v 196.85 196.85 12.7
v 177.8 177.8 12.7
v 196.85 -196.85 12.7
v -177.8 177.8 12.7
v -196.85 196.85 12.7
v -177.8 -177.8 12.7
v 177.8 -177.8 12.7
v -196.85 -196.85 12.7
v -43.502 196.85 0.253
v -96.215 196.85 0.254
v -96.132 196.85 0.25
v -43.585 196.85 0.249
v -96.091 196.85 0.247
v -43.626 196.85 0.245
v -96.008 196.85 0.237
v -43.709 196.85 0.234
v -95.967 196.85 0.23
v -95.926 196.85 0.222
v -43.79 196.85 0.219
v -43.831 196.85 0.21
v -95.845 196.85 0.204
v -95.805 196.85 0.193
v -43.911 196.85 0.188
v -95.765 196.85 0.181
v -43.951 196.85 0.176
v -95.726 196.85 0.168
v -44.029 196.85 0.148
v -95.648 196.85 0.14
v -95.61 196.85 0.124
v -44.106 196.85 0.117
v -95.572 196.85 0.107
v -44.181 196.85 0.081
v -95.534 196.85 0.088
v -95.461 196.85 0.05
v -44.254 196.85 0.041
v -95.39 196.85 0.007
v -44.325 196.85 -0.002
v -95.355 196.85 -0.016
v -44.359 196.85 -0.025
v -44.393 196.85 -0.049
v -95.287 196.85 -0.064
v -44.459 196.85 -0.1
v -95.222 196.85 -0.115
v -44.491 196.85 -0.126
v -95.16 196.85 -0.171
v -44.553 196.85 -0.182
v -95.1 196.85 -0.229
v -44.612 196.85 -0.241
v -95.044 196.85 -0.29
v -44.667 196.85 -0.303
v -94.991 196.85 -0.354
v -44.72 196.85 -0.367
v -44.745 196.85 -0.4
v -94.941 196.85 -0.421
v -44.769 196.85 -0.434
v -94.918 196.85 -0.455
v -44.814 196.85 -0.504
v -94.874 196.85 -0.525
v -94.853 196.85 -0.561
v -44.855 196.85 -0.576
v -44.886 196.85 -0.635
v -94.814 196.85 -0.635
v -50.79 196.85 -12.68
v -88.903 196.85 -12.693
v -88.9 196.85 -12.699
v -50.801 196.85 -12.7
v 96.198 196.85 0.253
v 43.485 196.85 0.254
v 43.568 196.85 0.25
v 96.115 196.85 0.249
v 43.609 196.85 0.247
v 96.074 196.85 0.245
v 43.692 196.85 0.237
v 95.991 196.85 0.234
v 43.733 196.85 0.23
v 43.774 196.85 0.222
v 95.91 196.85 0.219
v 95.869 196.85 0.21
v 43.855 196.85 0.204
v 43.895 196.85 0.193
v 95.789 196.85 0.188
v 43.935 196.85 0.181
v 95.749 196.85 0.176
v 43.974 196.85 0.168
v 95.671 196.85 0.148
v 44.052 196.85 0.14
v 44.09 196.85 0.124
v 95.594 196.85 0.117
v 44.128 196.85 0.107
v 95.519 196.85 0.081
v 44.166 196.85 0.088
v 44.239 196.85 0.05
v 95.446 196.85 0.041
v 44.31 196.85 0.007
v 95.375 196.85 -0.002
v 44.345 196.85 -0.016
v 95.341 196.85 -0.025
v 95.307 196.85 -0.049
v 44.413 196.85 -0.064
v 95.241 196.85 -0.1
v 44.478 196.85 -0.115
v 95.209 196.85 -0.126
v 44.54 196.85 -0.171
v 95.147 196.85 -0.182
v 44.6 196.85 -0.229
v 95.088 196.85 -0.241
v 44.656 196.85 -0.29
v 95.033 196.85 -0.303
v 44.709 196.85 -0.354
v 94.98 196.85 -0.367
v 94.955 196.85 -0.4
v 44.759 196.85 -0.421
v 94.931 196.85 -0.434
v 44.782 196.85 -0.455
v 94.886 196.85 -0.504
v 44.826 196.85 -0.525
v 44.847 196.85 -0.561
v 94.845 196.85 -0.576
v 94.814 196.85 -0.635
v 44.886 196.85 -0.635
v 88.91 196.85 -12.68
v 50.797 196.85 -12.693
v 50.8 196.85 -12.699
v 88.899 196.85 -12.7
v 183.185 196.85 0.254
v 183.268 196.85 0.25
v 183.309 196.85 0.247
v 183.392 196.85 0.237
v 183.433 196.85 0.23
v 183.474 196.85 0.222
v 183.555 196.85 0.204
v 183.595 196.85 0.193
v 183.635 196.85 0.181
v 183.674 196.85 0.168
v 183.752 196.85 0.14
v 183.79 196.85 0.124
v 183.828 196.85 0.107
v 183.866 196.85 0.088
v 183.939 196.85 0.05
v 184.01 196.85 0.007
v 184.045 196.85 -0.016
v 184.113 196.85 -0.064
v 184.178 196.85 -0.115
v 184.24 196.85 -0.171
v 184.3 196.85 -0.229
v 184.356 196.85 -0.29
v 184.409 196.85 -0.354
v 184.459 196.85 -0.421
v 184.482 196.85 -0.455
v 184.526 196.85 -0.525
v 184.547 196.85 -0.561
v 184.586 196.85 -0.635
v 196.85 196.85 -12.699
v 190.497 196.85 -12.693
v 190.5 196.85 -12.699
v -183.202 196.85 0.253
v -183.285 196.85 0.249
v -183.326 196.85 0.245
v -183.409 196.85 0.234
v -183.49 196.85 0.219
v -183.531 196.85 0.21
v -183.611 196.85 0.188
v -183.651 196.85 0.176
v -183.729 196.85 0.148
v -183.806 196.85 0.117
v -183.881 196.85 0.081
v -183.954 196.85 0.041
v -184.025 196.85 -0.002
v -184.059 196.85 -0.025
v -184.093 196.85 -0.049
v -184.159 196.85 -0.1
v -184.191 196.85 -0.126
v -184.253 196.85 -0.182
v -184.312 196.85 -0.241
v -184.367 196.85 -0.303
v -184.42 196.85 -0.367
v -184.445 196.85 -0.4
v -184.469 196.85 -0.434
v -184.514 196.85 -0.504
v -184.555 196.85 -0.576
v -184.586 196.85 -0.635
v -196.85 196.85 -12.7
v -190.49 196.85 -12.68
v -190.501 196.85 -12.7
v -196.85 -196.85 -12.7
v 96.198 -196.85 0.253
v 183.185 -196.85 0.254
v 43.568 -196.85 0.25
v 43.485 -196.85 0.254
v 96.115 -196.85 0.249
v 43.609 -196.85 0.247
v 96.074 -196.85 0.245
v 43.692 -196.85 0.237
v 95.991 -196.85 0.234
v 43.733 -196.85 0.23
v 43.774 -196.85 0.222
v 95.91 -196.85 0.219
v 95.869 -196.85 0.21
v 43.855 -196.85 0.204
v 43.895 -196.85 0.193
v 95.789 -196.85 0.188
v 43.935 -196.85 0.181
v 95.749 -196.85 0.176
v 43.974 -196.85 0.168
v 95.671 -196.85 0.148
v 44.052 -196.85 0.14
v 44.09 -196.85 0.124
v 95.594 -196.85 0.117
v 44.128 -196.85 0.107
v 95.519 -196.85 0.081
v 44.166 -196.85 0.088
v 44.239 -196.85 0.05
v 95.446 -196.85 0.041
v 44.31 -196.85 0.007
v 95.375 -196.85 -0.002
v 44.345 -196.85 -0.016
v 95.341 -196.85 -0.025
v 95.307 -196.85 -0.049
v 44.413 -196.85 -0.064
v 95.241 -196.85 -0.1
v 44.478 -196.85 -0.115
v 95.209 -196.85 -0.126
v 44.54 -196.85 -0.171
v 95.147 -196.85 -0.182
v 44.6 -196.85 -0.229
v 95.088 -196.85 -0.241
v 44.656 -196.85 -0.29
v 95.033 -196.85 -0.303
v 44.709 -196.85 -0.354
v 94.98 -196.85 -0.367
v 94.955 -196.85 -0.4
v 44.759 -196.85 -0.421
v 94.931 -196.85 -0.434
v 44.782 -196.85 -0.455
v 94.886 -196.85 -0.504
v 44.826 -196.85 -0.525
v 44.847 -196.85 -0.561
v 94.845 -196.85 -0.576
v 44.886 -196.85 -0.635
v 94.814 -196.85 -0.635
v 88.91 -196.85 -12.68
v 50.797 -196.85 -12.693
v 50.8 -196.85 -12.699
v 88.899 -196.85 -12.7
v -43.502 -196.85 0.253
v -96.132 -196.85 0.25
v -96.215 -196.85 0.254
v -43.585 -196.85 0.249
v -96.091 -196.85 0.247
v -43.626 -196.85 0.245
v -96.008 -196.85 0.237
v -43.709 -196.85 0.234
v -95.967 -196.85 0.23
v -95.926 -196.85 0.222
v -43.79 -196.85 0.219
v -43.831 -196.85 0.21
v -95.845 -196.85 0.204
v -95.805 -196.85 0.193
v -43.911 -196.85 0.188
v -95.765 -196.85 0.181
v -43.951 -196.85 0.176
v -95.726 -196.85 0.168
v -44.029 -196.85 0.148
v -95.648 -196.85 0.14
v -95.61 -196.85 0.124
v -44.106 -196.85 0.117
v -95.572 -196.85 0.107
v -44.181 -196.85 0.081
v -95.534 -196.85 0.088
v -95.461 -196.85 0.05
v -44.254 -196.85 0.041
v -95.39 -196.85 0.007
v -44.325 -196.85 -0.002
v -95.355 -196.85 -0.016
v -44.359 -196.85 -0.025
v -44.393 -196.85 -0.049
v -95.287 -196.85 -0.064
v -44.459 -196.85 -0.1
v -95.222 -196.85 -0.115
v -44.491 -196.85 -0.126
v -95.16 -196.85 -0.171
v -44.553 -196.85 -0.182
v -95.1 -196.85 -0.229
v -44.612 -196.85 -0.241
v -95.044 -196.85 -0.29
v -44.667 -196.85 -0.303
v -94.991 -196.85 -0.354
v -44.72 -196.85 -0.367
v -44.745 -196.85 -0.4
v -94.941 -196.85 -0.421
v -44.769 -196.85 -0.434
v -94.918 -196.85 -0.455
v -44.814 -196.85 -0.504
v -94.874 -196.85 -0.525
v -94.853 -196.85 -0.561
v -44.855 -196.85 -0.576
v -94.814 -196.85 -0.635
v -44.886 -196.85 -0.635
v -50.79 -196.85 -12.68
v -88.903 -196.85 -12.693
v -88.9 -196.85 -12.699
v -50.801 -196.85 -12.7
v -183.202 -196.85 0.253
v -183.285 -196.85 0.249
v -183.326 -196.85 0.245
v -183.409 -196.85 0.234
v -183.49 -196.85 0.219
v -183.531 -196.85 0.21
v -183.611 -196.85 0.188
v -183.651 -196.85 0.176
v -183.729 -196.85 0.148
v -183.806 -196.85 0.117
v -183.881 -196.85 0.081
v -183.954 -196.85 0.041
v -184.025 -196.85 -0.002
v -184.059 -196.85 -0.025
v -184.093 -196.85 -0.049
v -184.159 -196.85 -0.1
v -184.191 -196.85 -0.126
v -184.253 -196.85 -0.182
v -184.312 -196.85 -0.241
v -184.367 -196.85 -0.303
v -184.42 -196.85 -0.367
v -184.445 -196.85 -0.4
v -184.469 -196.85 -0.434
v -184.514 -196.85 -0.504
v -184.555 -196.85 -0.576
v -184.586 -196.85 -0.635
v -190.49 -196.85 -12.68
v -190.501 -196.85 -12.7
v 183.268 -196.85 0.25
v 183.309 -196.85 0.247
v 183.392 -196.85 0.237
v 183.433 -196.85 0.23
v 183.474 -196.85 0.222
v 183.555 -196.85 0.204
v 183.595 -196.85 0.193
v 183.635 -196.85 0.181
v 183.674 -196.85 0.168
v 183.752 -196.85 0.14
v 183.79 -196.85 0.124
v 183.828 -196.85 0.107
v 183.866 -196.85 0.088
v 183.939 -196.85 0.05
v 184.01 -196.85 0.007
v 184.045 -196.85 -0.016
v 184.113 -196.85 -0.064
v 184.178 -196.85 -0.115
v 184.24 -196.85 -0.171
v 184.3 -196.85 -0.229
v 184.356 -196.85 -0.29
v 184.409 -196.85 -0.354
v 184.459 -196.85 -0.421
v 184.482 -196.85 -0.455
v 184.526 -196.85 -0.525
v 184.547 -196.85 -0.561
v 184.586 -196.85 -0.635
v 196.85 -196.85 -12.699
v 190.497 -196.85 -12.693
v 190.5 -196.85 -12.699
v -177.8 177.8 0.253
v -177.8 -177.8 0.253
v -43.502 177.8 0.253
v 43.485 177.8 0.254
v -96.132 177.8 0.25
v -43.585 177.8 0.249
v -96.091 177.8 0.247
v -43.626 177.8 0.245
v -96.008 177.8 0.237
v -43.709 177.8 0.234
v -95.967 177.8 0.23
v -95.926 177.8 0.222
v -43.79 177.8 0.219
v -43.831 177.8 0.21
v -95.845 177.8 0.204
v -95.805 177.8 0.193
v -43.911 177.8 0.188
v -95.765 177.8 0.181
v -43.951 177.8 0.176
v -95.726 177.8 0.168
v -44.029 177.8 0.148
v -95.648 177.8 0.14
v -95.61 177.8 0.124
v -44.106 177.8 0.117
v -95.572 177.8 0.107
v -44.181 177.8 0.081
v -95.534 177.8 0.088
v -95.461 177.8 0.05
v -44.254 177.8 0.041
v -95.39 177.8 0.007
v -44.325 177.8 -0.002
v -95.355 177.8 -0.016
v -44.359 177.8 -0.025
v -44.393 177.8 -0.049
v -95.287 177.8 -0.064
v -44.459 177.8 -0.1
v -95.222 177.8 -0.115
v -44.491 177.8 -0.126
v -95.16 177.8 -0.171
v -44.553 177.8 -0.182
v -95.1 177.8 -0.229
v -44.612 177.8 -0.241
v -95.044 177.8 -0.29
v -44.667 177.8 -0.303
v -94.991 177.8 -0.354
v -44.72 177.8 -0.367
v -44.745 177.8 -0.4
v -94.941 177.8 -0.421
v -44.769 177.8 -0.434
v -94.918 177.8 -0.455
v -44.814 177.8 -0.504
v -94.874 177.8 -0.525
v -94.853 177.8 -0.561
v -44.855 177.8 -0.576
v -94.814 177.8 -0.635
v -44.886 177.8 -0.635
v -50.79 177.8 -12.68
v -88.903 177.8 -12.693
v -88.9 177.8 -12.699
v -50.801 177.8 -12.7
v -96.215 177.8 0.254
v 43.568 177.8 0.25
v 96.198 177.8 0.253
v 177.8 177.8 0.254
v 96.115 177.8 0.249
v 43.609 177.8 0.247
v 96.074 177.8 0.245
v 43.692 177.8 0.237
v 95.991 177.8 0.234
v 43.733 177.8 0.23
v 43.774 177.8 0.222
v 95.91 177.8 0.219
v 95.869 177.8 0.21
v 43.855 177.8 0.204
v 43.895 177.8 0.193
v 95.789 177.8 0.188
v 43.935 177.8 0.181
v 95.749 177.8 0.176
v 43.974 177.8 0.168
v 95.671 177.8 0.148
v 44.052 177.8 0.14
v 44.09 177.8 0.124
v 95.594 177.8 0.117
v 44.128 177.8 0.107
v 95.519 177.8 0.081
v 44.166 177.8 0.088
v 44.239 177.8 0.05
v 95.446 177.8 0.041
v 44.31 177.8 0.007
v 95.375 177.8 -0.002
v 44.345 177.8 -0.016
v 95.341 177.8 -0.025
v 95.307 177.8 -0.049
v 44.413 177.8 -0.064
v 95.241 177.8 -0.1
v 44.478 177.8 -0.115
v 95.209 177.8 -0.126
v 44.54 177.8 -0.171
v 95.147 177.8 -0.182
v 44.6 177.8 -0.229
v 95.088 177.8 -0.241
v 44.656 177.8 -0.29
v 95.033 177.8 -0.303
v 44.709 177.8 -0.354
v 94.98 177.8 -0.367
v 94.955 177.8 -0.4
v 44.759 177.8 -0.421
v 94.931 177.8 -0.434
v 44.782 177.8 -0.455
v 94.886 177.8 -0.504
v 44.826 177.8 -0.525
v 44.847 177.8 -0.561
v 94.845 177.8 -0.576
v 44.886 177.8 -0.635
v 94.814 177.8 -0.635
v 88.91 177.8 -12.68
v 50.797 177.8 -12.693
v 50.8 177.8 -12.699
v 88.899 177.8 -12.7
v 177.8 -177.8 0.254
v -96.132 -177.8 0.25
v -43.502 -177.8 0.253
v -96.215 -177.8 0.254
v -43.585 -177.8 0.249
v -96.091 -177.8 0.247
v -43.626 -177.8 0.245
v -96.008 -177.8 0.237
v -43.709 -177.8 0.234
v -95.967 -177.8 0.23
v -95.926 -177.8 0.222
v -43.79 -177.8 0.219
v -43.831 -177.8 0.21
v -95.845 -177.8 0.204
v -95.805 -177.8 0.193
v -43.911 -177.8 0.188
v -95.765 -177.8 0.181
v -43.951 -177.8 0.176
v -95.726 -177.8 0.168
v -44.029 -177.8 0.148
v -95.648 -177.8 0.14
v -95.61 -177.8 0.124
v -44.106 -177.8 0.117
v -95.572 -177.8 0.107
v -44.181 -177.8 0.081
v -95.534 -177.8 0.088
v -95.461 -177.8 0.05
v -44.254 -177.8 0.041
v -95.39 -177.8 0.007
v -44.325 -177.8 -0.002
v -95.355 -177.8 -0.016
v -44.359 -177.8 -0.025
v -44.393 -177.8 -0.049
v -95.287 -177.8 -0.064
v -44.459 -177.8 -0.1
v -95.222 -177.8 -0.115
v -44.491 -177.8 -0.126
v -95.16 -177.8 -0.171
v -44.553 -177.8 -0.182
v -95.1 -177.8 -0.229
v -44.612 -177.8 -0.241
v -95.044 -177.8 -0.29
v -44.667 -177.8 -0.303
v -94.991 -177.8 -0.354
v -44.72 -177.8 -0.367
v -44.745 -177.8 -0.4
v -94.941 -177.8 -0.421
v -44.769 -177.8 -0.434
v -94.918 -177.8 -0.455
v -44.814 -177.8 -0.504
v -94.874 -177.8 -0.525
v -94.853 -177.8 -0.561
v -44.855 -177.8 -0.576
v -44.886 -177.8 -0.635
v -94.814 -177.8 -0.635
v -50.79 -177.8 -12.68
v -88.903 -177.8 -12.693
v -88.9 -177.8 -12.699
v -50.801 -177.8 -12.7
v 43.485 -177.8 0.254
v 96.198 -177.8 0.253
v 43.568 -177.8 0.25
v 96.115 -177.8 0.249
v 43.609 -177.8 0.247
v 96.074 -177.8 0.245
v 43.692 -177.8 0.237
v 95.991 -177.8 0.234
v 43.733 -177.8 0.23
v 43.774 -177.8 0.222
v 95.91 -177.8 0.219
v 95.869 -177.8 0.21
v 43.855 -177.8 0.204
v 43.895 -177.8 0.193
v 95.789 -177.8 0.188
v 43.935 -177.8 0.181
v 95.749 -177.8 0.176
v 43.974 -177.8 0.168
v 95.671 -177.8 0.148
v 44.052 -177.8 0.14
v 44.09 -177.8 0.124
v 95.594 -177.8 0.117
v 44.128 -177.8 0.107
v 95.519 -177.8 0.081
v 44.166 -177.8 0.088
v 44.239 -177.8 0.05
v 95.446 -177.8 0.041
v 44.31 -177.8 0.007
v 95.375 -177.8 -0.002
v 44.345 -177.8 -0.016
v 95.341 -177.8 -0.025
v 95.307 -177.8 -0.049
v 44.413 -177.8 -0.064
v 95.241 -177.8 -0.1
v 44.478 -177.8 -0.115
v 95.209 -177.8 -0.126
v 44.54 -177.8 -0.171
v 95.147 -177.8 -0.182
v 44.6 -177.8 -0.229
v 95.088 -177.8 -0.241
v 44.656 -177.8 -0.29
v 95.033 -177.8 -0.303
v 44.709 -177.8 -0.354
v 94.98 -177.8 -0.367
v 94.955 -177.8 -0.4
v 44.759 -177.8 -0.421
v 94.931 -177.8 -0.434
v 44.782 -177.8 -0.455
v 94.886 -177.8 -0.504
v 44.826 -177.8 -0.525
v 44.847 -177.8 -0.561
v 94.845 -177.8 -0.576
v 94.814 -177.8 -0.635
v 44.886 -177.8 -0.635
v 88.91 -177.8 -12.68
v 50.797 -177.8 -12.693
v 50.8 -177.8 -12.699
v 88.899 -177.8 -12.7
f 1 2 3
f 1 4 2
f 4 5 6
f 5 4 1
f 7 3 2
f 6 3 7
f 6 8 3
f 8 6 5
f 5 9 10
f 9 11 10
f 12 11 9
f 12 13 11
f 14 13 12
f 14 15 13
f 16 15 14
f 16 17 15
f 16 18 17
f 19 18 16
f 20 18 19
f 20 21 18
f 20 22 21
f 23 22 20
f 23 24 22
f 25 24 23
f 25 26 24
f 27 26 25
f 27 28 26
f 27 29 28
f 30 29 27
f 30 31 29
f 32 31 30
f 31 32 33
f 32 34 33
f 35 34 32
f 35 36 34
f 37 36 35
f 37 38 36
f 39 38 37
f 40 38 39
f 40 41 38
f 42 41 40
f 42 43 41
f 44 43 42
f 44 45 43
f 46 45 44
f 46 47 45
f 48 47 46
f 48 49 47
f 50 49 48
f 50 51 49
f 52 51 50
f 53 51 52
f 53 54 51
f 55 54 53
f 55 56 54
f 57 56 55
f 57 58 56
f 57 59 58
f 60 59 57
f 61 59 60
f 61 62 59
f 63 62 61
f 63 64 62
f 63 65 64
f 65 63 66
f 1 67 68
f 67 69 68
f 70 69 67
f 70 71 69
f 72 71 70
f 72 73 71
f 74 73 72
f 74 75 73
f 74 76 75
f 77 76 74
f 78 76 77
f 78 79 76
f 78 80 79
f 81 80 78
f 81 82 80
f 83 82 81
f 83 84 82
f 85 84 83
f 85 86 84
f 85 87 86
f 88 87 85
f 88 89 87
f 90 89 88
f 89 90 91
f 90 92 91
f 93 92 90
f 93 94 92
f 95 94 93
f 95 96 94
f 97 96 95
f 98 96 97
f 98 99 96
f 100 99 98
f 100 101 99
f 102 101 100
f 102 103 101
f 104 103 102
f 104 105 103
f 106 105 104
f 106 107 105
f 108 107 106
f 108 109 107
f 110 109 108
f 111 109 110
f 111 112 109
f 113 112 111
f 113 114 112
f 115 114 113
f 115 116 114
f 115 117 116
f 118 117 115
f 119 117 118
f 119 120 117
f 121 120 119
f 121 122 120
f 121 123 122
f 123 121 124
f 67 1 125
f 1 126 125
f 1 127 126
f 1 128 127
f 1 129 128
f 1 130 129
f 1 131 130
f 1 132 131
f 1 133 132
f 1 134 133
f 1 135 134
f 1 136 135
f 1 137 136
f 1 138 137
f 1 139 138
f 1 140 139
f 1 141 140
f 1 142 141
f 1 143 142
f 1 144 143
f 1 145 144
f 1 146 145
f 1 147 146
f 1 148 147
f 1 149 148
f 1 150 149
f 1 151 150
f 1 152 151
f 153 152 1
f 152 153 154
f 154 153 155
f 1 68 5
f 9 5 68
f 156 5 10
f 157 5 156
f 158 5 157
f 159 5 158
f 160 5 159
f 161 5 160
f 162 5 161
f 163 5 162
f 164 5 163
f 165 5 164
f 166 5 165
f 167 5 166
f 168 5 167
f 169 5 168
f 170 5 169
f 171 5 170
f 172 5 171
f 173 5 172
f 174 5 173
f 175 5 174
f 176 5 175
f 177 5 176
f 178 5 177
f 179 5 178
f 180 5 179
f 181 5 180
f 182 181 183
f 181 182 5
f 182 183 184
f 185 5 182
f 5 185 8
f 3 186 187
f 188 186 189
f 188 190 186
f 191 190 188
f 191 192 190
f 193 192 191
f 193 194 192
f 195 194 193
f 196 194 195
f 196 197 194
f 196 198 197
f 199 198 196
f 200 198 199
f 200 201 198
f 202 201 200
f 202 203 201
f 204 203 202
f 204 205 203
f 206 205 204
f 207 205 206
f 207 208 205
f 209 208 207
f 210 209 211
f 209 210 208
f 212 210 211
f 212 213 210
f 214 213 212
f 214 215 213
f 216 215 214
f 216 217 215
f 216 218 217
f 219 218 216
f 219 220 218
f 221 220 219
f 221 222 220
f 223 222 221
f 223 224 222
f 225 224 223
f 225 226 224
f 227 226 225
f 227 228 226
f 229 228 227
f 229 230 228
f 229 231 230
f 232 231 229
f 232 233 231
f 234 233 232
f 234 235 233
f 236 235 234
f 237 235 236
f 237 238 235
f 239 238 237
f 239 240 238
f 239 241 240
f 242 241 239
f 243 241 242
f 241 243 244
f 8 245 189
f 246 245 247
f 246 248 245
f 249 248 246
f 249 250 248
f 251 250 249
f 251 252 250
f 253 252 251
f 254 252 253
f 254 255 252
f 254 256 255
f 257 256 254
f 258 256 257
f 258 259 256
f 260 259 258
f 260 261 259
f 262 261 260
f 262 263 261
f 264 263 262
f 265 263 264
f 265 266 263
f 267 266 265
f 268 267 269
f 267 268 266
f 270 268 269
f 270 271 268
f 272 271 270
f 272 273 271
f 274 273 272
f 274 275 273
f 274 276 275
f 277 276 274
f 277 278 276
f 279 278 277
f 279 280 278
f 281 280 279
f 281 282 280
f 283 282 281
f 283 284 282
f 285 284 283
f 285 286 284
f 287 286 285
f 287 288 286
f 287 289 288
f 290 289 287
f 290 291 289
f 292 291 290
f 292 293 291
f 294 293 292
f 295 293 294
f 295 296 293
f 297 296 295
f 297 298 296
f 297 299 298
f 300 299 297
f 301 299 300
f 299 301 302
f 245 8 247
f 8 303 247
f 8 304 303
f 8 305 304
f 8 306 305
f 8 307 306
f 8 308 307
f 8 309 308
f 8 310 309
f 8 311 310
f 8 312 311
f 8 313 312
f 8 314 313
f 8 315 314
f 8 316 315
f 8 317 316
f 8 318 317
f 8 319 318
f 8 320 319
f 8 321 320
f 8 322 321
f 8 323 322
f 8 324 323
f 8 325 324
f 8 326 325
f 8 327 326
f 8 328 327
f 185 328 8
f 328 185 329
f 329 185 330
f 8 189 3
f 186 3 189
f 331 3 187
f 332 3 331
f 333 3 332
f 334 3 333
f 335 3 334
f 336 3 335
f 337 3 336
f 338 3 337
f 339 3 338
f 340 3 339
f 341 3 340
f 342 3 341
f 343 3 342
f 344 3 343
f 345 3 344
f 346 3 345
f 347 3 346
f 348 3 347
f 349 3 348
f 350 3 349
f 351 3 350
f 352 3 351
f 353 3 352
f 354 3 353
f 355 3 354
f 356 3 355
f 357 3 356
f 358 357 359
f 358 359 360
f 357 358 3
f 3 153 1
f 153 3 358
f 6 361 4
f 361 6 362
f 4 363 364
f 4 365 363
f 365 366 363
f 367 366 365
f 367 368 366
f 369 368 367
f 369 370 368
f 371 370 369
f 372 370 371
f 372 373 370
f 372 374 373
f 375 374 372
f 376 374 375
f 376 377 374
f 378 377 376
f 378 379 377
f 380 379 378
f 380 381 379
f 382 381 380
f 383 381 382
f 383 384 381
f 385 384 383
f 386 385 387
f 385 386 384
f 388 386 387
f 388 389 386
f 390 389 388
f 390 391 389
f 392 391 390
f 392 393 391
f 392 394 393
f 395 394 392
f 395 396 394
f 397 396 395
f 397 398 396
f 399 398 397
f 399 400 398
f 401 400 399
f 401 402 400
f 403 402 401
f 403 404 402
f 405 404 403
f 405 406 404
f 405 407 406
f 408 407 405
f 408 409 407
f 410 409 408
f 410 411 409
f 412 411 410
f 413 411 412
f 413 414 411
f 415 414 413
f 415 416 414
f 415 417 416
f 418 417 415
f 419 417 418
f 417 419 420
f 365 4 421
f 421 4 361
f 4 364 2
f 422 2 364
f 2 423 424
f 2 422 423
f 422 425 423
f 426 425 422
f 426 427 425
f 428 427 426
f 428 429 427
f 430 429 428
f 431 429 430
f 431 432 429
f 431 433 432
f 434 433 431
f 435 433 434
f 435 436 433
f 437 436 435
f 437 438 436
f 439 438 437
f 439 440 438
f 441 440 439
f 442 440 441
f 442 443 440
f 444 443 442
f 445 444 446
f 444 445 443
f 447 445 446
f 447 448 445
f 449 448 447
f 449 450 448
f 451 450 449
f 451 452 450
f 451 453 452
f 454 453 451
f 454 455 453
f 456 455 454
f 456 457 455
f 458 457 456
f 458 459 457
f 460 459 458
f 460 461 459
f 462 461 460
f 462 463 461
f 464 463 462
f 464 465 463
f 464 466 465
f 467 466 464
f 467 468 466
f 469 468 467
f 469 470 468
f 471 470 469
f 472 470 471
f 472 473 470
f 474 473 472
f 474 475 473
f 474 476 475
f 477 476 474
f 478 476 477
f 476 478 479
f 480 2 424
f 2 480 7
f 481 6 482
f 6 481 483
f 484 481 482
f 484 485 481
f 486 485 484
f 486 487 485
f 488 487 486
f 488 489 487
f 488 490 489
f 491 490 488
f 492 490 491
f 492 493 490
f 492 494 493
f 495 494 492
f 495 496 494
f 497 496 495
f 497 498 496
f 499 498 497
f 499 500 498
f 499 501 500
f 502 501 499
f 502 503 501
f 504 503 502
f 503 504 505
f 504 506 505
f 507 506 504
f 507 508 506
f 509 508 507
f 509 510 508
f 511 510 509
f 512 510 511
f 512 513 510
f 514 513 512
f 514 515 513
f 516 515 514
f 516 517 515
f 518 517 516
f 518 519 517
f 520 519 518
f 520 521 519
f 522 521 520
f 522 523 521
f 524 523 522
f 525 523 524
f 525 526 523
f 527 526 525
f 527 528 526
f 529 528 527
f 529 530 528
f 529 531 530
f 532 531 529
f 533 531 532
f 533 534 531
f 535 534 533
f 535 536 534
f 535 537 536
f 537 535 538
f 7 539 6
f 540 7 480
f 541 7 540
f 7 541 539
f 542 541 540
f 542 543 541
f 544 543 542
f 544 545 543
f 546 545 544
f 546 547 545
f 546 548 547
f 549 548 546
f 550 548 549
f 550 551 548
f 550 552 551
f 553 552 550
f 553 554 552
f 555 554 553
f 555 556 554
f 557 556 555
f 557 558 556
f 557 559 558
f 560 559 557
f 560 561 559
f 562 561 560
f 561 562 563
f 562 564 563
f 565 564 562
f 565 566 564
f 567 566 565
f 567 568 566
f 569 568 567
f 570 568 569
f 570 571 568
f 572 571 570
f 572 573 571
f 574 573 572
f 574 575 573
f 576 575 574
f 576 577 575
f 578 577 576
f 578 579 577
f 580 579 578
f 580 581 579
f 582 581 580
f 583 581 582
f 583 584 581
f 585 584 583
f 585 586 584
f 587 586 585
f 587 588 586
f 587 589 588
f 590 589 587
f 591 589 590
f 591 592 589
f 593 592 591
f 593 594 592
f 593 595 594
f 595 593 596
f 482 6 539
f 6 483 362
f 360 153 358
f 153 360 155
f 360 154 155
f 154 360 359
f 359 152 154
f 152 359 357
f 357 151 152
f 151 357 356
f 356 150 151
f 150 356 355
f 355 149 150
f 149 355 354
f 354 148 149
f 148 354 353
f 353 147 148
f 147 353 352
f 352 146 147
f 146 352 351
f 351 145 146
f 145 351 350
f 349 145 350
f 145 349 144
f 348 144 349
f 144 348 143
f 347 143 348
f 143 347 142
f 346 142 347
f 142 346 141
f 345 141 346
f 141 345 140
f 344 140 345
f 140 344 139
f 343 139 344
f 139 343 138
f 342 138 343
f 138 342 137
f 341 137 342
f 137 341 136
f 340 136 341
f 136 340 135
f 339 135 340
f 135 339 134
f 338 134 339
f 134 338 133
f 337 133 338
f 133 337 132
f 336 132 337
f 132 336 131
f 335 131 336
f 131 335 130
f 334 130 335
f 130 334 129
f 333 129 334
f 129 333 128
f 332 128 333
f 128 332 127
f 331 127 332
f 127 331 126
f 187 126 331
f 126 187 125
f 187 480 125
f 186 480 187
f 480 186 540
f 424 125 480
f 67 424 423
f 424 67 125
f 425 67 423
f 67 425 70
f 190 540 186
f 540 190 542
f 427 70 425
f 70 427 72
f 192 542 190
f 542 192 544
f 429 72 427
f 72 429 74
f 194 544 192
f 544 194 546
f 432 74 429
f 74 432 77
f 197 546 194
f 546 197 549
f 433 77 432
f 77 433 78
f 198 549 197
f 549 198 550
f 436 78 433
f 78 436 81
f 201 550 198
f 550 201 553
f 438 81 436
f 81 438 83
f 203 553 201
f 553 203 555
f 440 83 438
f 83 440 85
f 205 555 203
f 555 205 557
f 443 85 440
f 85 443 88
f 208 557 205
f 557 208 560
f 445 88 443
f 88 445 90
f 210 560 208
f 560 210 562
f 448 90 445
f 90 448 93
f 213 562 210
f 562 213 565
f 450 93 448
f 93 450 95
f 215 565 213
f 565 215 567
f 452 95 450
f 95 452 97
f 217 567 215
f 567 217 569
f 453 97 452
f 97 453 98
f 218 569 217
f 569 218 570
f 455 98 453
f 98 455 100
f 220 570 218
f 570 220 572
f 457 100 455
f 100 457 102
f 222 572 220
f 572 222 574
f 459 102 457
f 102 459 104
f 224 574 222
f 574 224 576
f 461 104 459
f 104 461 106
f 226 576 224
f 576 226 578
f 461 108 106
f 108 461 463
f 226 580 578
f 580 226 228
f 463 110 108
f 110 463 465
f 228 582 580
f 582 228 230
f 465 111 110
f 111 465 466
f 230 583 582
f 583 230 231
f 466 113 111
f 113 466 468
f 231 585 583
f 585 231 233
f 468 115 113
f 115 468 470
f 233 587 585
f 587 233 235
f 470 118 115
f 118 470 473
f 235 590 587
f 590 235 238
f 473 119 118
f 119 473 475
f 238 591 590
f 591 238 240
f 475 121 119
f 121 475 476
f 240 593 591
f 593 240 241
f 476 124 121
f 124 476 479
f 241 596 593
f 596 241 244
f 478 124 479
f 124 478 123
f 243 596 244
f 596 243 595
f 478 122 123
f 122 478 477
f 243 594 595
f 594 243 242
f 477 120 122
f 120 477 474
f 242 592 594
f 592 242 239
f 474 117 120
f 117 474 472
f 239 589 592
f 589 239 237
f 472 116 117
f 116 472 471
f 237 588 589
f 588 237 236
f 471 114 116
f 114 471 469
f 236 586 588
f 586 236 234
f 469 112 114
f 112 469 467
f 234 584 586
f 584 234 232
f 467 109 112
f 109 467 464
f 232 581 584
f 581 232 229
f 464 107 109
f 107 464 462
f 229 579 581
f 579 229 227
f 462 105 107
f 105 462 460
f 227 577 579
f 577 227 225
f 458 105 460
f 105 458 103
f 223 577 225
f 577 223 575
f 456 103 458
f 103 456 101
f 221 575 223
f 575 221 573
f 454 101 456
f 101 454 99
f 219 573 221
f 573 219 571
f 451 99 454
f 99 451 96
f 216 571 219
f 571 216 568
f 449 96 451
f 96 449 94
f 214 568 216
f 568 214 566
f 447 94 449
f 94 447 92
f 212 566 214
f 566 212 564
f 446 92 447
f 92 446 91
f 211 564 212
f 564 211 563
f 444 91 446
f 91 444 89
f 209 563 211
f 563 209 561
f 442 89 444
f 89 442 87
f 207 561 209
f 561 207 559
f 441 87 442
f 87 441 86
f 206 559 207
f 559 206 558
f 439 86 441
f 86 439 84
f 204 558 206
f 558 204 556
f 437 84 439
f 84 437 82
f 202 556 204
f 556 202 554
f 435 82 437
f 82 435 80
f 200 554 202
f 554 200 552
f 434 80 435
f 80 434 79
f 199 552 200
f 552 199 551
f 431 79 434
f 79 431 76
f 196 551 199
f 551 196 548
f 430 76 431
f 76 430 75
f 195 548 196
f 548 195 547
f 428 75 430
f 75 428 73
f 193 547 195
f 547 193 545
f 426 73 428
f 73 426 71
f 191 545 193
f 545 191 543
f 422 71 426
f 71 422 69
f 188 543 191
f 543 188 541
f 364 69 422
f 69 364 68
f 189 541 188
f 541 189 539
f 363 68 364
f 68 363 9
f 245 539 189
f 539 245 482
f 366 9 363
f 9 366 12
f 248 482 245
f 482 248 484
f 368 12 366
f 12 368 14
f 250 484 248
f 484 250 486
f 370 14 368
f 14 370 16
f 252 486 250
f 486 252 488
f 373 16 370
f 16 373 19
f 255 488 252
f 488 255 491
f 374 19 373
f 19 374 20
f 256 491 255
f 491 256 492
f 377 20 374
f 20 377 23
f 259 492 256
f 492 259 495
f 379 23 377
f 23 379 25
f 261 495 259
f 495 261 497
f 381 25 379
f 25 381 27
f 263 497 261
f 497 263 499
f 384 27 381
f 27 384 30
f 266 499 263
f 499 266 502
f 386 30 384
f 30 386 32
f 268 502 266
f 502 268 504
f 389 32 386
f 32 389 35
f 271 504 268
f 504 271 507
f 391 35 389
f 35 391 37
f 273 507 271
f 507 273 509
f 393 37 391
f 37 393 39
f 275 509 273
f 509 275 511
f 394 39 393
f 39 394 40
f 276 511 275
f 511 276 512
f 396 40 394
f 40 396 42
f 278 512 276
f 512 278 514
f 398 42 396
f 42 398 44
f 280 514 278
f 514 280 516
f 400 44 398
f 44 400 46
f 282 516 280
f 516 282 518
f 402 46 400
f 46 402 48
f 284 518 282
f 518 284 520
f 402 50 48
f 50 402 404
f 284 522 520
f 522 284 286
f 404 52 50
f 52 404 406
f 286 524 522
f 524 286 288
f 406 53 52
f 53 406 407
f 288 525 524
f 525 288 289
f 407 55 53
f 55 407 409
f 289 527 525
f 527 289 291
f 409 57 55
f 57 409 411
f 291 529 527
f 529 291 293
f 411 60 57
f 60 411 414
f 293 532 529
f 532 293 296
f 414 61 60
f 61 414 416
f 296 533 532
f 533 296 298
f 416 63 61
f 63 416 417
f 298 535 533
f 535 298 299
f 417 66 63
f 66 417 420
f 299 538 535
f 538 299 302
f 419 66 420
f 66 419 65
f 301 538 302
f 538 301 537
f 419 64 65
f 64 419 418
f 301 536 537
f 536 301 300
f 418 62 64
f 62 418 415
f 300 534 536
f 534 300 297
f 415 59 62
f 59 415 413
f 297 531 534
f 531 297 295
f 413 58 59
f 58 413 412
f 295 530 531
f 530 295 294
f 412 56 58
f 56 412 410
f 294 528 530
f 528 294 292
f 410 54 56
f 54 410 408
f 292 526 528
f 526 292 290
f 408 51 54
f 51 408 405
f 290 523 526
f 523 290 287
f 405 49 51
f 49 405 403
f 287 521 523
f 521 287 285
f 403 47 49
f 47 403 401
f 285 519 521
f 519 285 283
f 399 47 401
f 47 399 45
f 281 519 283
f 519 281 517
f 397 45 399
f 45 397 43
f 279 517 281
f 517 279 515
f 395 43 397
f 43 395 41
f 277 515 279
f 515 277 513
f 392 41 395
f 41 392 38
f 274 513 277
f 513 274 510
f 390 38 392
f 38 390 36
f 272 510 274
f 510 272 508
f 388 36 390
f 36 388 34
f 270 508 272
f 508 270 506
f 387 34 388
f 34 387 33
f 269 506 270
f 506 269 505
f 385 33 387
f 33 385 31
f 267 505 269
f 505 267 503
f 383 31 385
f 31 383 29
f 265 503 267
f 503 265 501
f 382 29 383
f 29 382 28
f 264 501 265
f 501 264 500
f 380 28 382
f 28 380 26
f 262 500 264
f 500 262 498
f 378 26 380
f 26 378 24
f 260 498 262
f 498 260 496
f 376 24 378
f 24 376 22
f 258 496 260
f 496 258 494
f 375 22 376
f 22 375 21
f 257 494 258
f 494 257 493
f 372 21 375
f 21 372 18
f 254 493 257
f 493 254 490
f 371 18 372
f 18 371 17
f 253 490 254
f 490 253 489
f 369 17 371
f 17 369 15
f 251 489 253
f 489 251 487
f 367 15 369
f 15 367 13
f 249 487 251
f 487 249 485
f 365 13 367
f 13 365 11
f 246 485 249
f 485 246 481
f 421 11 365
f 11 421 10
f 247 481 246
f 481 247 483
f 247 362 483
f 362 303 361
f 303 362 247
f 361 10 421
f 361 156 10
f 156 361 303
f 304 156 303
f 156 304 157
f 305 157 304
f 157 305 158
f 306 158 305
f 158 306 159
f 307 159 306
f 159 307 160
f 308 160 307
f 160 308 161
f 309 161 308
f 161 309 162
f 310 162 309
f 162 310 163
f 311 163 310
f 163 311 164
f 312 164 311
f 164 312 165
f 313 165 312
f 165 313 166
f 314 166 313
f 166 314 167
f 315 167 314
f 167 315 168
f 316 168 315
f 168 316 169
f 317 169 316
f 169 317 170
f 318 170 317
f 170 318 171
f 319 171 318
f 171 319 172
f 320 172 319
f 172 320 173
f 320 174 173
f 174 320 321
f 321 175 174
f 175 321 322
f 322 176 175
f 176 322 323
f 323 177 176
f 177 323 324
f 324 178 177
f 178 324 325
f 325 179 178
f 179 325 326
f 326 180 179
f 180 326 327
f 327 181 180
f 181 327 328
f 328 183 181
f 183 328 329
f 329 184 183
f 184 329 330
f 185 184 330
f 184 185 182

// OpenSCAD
// file: corrugated_roof.scad
// =============================================================================
// corrugated_roof.scad
//
// Parametric model of a periodic sinusoidal "corrugated" sheet-metal roof --
// the classic wavy metal panel seen on sheds, barns, and some industrial
// vehicles. Signature-compatible with trapezoidal_roof.scad's cutter so the
// adapters can dispatch between the two at render time.
//
// Exports:
//     module corrugated_roof_cutter(...)  - solid block on one side of the
//                                           roof surface, sized for
//                                           subtraction from a blank.
//     module corrugated_roof_sheet(...)   - thin sheet-metal-like
//                                           visualization of the roof.
//
// The trapezoidal file owns `sheet_thickness` (and `corner_r`); this file
// only declares corrugated-specific variables so both can be `include`d in
// the same adapter without collisions.
// =============================================================================

// -----------------------------------------------------------------------------
// Corrugated cross-section defaults (inches). Overridable via -D.
// -----------------------------------------------------------------------------
corr_pitch = 2.667;    // rib-to-rib spacing (one full wave, "wavelength")
corr_depth = 0.500;    // peak-to-trough vertical distance

// Derived
corr_indent_center_x = corr_pitch / 2;   // half-wavelength from a peak = trough centerline

// =============================================================================
// corrugated_roof_cutter(fan_offset_x, pitch, depth, cut_xy, cut_z, side,
//                       thickness, samples_per_pitch)
//
// See trapezoidal_roof_cutter for parameter semantics. `fan_offset_x = 0`
// puts a peak (rib) at X = 0; `fan_offset_x = corr_indent_center_x` puts a
// trough (indent) at X = 0.
// =============================================================================
module corrugated_roof_cutter(
    fan_offset_x      = 0,
    pitch             = corr_pitch,
    depth             = corr_depth,
    cut_xy            = 40,
    cut_z             = 5,
    side              = "top",
    thickness         = 0.032,
    samples_per_pitch = 64
) {
    z_shift = (side == "bottom") ? -thickness : 0;
    translate([0, 0, z_shift])
        rotate([90, 0, 0])
            linear_extrude(height = 2*cut_xy, center = true)
                corrugated_roof_profile_2d(
                    fan_offset_x      = fan_offset_x,
                    pitch             = pitch,
                    depth             = depth,
                    cut_xy            = cut_xy,
                    cut_z             = cut_z,
                    side              = side,
                    samples_per_pitch = samples_per_pitch
                );
}

// The 2D cross-section of the cutter. `y = top_y` at the peak (rib plateau
// level, at Z = 0 after the extrude/rotate) and `y = top_y - depth` at the
// trough. Enough samples per wavelength that the polygon reads as a smooth
// curve after linear_extrude.
module corrugated_roof_profile_2d(
    fan_offset_x,
    pitch,
    depth,
    cut_xy,
    cut_z,
    side              = "top",
    samples_per_pitch = 64
) {
    top_y   = 0.010;              // small overlap above the rib plateau, matches trapezoidal
    amp     = depth / 2;          // half of peak-to-trough
    total_x = 2 * cut_xy;
    n       = max(2, ceil(total_x / pitch * samples_per_pitch));
    step    = total_x / n;

    // z(x) = top_y - amp + amp*cos(...) so peaks touch top_y and troughs sit at top_y - depth.
    surface_ltr = [
        for (i = [0 : n])
            let (x = -cut_xy + i * step)
            [x, top_y - amp + amp * cos(360 * (x - fan_offset_x) / pitch)]
    ];

    pts = (side == "top")
        ? concat(
            [[-cut_xy, -cut_z], [+cut_xy, -cut_z]],
            [ for (i = [n : -1 : 0]) surface_ltr[i] ]
        )
        : concat(
            [[+cut_xy, +cut_z], [-cut_xy, +cut_z]],
            surface_ltr
        );

    polygon(pts);
}

// =============================================================================
// corrugated_roof_sheet(...)
//
// Thin sheet-metal visualization of the roof. Same top surface as
// corrugated_roof_cutter, closed to a bottom offset down by `sheet_thickness`.
// =============================================================================
module corrugated_roof_sheet(
    fan_offset_x      = 0,
    pitch             = corr_pitch,
    depth             = corr_depth,
    cut_xy            = 12,
    sheet_thickness   = 0.100,     // visualization thickness; not physically accurate
    samples_per_pitch = 64
) {
    rotate([90, 0, 0])
        linear_extrude(height = 2*cut_xy, center = true)
            corrugated_roof_sheet_2d(
                fan_offset_x      = fan_offset_x,
                pitch             = pitch,
                depth             = depth,
                cut_xy            = cut_xy,
                sheet_thickness   = sheet_thickness,
                samples_per_pitch = samples_per_pitch
            );
}

module corrugated_roof_sheet_2d(
    fan_offset_x,
    pitch,
    depth,
    cut_xy,
    sheet_thickness,
    samples_per_pitch = 64
) {
    top_y   = 0.010;
    amp     = depth / 2;
    total_x = 2 * cut_xy;
    n       = max(2, ceil(total_x / pitch * samples_per_pitch));
    step    = total_x / n;

    top_ltr = [
        for (i = [0 : n])
            let (x = -cut_xy + i * step)
            [x, top_y - amp + amp * cos(360 * (x - fan_offset_x) / pitch)]
    ];
    // Bottom face parallels the top by shifting each Y down by sheet_thickness.
    bot_rtl = [ for (i = [n : -1 : 0]) [ top_ltr[i][0], top_ltr[i][1] - sheet_thickness ] ];

    polygon(concat(top_ltr, bot_rtl));
}
// main file
// =============================================================================
// rectangular_adapter.scad
//
// A rectangular mounting adapter (14x14-style MaxxFan family) that conforms
// to a periodic trapezoidal-rib roof (see trapezoidal_roof.scad). Structure
// is identical to circular_adapter.scad; only the blank shape differs
// (rectangular frame instead of an annulus).
//
// Topside and underside variants are the two halves of a single cylinder
// (well, rectangular prism) split along the roof surface -- see
// circular_adapter.scad for the full explanation.
//
// All dimensions in inches; final scale converts to millimeters.
// =============================================================================

include <trapezoidal_roof.scad>
include <corrugated_roof.scad>

// -----------------------------------------------------------------------------
// Roof profile: which cross-section to conform the underside to
// -----------------------------------------------------------------------------
roof_profile = "trapezoidal";            // "trapezoidal" or "corrugated"
roof_depth   = (roof_profile == "corrugated") ? corr_depth : indent_depth;

// -----------------------------------------------------------------------------
// Adapter shape
// -----------------------------------------------------------------------------
inner_x     = 14.000;                     // fan cutout size in X (across ribs)
inner_y     = 14.000;                     // fan cutout size in Y (along ribs)
outer_x     = 15.500;                     // overall X extent
outer_y     = 15.500;                     // overall Y extent
main_thick  = roof_depth;                 // thickness of this piece above/below the rib plateau plane

// -----------------------------------------------------------------------------
// Position of the fan center on the roof and which side the adapter mounts on
// -----------------------------------------------------------------------------
fan_offset_x = 0;                         // 0 = rib-centered; indent_center_x = indent-centered
side         = "top";                     // "top" (outside of vehicle) or "bottom" (inside cabin)

// -----------------------------------------------------------------------------
// Render controls
// -----------------------------------------------------------------------------
$fn    = 240;
IN2MM  = 25.4;

// -----------------------------------------------------------------------------
// Derived (see circular_adapter.scad for the rationale on the Z math)
// -----------------------------------------------------------------------------
z_top  = (side == "top") ? +main_thick    : -sheet_thickness;
z_bot  = (side == "top") ? -roof_depth    : -main_thick - roof_depth - sheet_thickness;
cut_xy = 2 * max(outer_x, outer_y);
cut_z  = 4 * roof_depth;

scale([IN2MM, IN2MM, IN2MM]) rectangular_adapter();

// =============================================================================
// Modules
// =============================================================================

module rectangular_adapter() {
    difference() {
        translate([0, 0, z_bot])
            linear_extrude(height = z_top - z_bot)
                difference() {
                    square([outer_x, outer_y], center = true);
                    square([inner_x, inner_y], center = true);
                }
        roof_cutter();
    }
}

module roof_cutter() {
    if (roof_profile == "corrugated")
        corrugated_roof_cutter(
            fan_offset_x = fan_offset_x,
            pitch        = corr_pitch,
            depth        = corr_depth,
            cut_xy       = cut_xy,
            cut_z        = cut_z,
            side         = side,
            thickness    = sheet_thickness
        );
    else
        trapezoidal_roof_cutter(
            fan_offset_x = fan_offset_x,
            cut_xy       = cut_xy,
            cut_z        = cut_z,
            side         = side,
            thickness    = sheet_thickness
        );
}
